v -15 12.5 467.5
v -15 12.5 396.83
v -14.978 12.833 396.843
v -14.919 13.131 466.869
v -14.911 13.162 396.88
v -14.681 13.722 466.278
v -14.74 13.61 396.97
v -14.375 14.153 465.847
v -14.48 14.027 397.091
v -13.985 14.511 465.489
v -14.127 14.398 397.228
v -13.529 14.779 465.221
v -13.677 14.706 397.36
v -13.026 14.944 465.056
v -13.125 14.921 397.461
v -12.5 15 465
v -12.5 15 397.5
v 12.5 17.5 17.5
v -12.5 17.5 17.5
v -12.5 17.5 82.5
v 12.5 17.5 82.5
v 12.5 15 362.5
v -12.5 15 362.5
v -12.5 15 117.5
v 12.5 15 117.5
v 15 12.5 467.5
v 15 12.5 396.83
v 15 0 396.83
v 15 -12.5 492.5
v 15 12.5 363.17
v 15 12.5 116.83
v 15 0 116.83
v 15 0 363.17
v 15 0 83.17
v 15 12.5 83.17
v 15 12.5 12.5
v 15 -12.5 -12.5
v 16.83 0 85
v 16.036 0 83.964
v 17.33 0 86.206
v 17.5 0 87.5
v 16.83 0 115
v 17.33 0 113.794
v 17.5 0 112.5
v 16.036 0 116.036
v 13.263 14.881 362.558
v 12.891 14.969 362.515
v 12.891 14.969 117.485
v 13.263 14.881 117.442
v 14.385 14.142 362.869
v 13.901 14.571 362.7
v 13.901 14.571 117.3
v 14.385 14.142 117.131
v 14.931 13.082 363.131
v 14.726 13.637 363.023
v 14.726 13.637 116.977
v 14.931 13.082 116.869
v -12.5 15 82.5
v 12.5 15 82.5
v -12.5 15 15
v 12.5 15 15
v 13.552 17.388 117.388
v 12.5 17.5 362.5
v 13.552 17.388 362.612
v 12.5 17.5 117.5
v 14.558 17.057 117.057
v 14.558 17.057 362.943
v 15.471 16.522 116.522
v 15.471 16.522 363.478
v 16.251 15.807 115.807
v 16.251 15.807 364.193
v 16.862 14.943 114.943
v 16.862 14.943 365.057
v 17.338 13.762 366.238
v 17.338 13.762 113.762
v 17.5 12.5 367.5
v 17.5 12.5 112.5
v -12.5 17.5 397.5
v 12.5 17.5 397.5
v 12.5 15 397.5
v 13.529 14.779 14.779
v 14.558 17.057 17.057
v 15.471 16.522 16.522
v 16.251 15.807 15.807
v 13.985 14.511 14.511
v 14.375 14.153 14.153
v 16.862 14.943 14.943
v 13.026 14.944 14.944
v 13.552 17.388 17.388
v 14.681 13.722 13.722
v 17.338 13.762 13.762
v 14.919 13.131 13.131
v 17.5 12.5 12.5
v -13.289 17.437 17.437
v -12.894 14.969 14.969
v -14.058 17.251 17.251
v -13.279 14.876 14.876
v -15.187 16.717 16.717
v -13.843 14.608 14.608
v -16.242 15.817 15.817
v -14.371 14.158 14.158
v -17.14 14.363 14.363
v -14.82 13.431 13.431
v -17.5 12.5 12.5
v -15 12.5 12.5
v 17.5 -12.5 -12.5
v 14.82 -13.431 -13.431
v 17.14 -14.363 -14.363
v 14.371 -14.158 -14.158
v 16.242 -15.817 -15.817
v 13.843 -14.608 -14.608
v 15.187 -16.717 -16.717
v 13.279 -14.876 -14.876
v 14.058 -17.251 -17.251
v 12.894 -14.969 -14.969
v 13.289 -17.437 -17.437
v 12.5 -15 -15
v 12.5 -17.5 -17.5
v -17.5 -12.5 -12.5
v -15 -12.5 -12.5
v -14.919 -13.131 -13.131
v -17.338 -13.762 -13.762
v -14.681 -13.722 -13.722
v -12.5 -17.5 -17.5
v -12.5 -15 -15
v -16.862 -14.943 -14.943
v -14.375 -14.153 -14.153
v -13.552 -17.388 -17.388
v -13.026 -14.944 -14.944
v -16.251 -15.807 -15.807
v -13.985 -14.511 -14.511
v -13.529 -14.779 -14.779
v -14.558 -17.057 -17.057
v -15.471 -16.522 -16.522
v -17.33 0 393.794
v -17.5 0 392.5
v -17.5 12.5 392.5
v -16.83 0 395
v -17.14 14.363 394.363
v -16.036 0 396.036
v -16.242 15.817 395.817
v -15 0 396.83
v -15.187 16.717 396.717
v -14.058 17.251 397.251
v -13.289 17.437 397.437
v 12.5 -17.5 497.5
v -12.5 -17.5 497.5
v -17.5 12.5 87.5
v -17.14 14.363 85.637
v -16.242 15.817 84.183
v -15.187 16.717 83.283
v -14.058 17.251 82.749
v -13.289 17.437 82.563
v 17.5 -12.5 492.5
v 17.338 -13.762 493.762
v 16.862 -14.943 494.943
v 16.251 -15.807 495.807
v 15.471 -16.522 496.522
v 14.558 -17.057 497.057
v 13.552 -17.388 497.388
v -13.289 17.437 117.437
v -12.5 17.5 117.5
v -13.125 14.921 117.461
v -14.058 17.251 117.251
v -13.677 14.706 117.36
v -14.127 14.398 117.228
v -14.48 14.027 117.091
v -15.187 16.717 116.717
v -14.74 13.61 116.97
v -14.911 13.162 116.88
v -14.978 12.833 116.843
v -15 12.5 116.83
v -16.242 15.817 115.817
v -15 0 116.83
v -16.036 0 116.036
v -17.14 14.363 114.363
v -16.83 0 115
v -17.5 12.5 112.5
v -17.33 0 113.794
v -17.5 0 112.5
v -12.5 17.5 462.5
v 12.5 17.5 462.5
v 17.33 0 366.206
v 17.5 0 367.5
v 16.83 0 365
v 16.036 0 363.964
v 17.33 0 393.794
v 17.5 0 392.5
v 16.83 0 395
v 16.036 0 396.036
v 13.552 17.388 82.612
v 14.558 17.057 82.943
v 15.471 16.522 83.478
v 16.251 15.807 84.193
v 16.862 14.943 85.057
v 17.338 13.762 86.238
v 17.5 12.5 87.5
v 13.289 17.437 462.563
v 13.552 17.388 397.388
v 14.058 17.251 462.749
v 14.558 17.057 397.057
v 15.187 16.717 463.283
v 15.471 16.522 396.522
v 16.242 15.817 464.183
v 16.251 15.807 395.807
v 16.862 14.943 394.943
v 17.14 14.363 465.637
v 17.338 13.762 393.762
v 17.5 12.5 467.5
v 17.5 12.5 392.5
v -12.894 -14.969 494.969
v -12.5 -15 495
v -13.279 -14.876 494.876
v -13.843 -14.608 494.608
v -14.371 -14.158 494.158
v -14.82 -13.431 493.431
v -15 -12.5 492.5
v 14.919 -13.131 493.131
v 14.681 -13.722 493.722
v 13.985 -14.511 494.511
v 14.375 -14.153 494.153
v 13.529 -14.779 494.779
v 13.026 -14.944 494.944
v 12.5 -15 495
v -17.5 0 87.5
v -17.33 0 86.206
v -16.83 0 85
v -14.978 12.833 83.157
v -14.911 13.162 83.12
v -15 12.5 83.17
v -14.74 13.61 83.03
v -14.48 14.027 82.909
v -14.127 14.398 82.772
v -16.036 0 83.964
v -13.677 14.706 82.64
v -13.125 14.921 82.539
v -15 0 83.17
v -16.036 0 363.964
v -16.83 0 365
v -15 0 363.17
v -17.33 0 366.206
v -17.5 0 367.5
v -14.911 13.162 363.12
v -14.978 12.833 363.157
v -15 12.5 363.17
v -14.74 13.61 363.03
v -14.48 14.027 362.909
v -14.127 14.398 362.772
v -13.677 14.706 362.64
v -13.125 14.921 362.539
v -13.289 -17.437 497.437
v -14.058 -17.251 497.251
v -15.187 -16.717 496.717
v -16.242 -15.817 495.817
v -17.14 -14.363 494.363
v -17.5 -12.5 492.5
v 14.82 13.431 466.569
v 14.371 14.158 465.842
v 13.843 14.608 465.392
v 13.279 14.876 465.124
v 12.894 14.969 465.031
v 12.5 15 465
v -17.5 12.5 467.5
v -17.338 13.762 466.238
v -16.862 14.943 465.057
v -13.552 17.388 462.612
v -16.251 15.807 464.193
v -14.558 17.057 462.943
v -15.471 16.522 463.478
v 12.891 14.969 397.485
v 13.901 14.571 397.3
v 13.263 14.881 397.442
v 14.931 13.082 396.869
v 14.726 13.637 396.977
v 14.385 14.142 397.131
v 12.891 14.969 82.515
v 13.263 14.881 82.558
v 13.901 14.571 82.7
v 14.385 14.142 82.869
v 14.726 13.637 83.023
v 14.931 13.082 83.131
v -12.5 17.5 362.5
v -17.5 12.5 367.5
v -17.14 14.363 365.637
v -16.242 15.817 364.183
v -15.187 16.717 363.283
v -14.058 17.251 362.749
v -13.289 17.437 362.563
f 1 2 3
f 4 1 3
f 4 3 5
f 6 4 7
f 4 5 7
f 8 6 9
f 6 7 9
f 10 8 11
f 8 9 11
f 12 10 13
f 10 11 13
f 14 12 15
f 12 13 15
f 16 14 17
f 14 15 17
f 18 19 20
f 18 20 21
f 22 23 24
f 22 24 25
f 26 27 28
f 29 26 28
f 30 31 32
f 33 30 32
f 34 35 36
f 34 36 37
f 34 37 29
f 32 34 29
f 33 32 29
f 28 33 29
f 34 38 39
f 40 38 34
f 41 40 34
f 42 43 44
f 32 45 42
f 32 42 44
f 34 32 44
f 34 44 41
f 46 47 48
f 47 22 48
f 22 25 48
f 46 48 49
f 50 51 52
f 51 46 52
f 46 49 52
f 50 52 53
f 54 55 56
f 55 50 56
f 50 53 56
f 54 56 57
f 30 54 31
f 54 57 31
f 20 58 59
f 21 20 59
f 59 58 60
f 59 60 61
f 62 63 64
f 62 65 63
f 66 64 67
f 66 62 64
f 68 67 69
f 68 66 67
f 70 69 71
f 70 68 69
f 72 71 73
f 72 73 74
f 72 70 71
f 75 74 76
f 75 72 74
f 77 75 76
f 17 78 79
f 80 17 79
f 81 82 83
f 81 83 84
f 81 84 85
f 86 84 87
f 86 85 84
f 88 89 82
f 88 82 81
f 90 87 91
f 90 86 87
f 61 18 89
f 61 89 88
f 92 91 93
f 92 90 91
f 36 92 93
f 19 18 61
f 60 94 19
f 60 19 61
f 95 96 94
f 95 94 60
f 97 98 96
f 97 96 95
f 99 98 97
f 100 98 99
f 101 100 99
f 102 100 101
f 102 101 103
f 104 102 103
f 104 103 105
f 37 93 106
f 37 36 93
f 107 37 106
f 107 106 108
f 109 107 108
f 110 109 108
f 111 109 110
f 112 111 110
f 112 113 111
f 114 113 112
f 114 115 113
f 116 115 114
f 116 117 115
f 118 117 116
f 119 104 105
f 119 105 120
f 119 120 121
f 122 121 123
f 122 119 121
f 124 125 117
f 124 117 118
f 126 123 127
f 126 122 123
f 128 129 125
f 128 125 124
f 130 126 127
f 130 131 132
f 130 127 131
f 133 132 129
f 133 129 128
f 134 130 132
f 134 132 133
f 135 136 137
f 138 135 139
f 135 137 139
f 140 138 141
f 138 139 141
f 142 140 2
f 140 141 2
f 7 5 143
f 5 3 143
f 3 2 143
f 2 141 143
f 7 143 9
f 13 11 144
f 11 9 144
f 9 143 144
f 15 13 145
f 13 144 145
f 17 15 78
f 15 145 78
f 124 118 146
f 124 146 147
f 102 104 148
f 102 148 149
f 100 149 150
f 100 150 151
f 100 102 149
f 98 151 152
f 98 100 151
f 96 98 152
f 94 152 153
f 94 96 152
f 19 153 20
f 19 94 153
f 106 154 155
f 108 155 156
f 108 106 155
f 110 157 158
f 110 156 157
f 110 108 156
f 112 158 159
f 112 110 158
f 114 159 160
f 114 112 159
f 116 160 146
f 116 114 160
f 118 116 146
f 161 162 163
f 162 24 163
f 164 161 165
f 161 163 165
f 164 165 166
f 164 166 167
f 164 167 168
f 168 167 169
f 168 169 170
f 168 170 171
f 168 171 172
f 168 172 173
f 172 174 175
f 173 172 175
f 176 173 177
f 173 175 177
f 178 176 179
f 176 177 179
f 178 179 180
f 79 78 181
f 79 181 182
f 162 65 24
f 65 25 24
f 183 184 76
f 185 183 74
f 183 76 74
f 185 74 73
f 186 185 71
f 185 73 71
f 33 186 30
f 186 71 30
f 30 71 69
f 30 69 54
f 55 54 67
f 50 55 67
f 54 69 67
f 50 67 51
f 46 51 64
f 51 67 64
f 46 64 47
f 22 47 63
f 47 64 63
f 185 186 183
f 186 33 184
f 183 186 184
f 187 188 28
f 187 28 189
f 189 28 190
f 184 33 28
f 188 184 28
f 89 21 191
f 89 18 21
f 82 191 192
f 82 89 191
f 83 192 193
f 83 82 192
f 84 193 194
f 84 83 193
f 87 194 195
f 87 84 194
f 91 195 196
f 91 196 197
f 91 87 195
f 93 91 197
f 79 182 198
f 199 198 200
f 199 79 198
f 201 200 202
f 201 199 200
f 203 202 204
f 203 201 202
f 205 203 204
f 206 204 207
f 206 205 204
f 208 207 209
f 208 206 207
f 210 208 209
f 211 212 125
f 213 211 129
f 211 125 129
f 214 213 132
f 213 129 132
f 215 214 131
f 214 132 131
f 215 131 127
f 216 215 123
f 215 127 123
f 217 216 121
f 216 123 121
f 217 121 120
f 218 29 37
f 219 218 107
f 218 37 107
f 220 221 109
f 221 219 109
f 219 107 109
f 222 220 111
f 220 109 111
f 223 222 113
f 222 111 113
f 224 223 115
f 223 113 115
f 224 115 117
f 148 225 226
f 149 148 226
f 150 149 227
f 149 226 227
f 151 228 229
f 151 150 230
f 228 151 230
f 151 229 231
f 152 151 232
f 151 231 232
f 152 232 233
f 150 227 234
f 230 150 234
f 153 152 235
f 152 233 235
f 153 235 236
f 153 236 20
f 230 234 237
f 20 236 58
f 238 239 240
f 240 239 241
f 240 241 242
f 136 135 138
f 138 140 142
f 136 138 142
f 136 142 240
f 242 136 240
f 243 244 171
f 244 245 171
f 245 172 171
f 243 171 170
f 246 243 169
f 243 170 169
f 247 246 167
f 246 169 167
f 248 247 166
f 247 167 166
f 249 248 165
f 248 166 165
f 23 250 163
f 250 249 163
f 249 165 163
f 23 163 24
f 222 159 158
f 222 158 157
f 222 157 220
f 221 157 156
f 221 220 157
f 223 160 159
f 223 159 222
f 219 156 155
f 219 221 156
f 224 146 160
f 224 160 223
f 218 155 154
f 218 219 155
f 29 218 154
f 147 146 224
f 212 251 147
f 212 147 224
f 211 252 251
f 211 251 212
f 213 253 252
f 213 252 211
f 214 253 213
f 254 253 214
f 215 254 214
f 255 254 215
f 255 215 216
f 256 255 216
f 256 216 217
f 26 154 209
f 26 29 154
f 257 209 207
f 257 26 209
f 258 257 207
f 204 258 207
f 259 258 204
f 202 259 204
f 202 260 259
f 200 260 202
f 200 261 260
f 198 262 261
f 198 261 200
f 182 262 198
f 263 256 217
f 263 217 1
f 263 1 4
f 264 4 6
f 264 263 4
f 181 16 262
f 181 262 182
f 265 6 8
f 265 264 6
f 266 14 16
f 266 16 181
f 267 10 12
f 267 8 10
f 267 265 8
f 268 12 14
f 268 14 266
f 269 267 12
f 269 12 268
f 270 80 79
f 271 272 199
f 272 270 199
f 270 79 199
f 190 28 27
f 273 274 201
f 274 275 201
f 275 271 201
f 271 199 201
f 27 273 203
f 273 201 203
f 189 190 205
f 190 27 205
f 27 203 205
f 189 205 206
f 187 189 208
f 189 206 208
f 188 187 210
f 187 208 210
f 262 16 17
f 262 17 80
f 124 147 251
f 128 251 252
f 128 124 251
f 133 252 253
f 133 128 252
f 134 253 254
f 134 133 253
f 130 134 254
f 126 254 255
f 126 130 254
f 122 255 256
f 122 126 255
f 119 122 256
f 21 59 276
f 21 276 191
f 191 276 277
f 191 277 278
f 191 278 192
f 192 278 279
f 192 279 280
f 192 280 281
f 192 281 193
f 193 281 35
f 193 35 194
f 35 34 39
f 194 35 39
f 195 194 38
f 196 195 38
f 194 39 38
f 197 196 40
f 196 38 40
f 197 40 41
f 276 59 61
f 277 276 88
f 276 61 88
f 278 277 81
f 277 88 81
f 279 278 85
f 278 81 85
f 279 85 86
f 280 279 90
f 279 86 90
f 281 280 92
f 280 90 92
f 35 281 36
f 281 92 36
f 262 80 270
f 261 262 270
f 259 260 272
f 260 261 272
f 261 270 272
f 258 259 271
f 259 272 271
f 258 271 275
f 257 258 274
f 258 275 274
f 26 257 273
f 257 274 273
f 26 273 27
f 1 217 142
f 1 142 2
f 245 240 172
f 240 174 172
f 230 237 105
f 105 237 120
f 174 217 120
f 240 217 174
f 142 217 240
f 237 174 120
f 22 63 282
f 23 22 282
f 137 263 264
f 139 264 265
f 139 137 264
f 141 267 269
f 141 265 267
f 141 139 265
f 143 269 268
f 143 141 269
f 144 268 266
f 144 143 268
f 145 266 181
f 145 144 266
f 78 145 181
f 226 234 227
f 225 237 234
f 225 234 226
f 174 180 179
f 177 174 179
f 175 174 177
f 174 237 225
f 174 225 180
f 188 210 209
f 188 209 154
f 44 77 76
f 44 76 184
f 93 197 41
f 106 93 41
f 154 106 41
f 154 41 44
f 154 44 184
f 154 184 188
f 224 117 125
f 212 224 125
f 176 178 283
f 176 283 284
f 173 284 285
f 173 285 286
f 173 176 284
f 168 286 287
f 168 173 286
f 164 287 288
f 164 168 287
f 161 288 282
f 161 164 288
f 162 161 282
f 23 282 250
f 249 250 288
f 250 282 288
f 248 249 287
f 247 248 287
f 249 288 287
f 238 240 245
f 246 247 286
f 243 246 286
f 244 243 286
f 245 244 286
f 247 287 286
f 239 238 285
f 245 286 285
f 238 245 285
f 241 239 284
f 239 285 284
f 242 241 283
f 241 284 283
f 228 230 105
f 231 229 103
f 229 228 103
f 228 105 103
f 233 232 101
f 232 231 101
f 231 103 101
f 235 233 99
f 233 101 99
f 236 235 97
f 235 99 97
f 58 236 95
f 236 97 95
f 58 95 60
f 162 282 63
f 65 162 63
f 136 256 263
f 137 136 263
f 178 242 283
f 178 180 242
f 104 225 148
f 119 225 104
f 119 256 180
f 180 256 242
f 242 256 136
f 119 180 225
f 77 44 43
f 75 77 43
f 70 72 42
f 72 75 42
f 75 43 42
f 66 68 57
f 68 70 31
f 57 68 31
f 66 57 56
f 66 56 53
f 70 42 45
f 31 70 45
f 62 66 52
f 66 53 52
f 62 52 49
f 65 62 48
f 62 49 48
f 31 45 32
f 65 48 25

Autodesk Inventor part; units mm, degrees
ref_plane "Start plane" through (0, 0, -17.5) normal (0, 0, 1) x (1, 0, 0)
ref_plane "End plane" through (0, 0, 497.5) normal (0, 0, 1) x (1, 0, 0)
sketch "Sketch" plane through (0, 0, 0) normal (0, 0, 1) x (1, 0, 0)
  line L0 (-17.5, -12.5) -> (-17.5, 12.5)
  line L1 (-12.5, 17.5) -> (12.5, 17.5)
  line L2 (17.5, 12.5) -> (17.5, -12.5)
  line L3 (12.5, -17.5) -> (-12.5, -17.5)
  arc A0 (-17.5, -12.5) -> (-12.5, -17.5) centre (-12.5, -12.5) ccw
  arc A1 (-12.5, 17.5) -> (-17.5, 12.5) centre (-12.5, 12.5) ccw
  arc A2 (17.5, 12.5) -> (12.5, 17.5) centre (12.5, 12.5) ccw
  arc A3 (12.5, -17.5) -> (17.5, -12.5) centre (12.5, -12.5) ccw
  arc A4 (-12.5, 15) -> (-15, 12.5) centre (-12.5, 12.5) ccw
  line L4 (-12.5, 15) -> (12.5, 15)
  arc A5 (15, 12.5) -> (12.5, 15) centre (12.5, 12.5) ccw
  line L5 (15, 12.5) -> (15, -12.5)
  arc A6 (12.5, -15) -> (15, -12.5) centre (12.5, -12.5) ccw
  line L6 (12.5, -15) -> (-12.5, -15)
  arc A7 (-15, -12.5) -> (-12.5, -15) centre (-12.5, -12.5) ccw
  line L7 (-15, -12.5) -> (-15, 12.5)
  line L8 (0, 25.9497) -> (0, -25.9497) construction
  line L9 (-25.9497, 0) -> (25.9497, 0) construction
  dimension "d7" = 5
  dimension "d10" = 35
  dimension "d11" = 35
  dimension "d12" = 2.5
  dimension "d15" = 17.5
  dimension "d16" = 17.5
extrude "Body" add sketch "Sketch" along normal up to surface (515 mm away) from surface at -17.5
sketch "Sketch3" plane through (0, 0, 0) normal (0, 0, 1) x (1, 0, 0)
  line L0 (0, 0) -> (10, 0)
ref_plane "Work Plane3" through (0, 0, 0) normal (0, -1, 0) x (1, 0, 0)
sketch "Sketch4" plane through (0, 0, 0) normal (0, -1, 0) x (1, 0, 0)
  line L0 (-2, -17.5) -> (12, -17.5)
  line L1 (-2, 497.5) -> (12, 497.5)
  dimension "d18" = 515
ref_plane "Work Plane4" through (107.5, 0, -17.5) normal (0, 0, -1) x (-1, 0, 0)
split "Split1" plane through (107.5, 0, -17.5) removes the side toward (0, 0, -1)
ref_plane "Work Plane5" through (0, -17.5, 497.5) normal (0, 0.7071, 0.7071) x (1, 0, 0)
split "Split2" plane through (0, -17.5, 497.5) removes the side toward (0, 0.7071, 0.7071)
ref_plane "Work Plane7" through (0, 780, 380) normal (0, -1, 0) x (1, 0, 0)
ref_plane "Work Plane8" through (0, 0, 380) normal (0, -1, 0) x (1, 0, 0)
ref_plane "Work Plane9" through (0, 390, 380) normal (0, -1, 0) x (1, 0, 0)
ref_plane "Work Plane10" through (0, 0, 100) normal (0, 1, 0) x (-1, 0, 0)
ref_plane "Work Plane11" through (0, 780, 100) normal (0, 1, 0) x (-1, 0, 0)
ref_plane "Work Plane12" through (0, 390, 100) normal (0, 1, 0) x (-1, 0, 0)
ref_plane "Work Plane13" through (0, -17.5, -17.5) normal (0, 0.7071, -0.7071) x (1, 0, 0)
split "Split4" plane through (0, -17.5, -17.5) removes the side toward (0, 0.7071, -0.7071)
sketch "Sketch5" plane through (0, 390, 380) normal (0, -1, 0) x (1, 0, 0)
  arc A0 (-17.5, -12.5) -> (-12.5, -17.5) centre (-12.5, -12.5) ccw
  line L0 (-17.5, -12.5) -> (-17.5, 12.5)
  arc A1 (-12.5, 17.5) -> (-17.5, 12.5) centre (-12.5, 12.5) ccw
  line L1 (-12.5, 17.5) -> (12.5, 17.5)
  arc A2 (17.5, 12.5) -> (12.5, 17.5) centre (12.5, 12.5) ccw
  line L2 (17.5, 12.5) -> (17.5, -12.5)
  arc A3 (12.5, -17.5) -> (17.5, -12.5) centre (12.5, -12.5) ccw
  line L3 (12.5, -17.5) -> (-12.5, -17.5)
  arc A4 (-12.5, 15) -> (-15, 12.5) centre (-12.5, 12.5) ccw
  line L4 (-12.5, 15) -> (12.5, 15)
  arc A5 (15, 12.5) -> (12.5, 15) centre (12.5, 12.5) ccw
  line L5 (15, 12.5) -> (15, -12.5)
  arc A6 (12.5, -15) -> (15, -12.5) centre (12.5, -12.5) ccw
  line L6 (12.5, -15) -> (-12.5, -15)
  arc A7 (-15, -12.5) -> (-12.5, -15) centre (-12.5, -12.5) ccw
  line L7 (-15, -12.5) -> (-15, 12.5)
extrude "Extrusion2" cut sketch "Sketch5" along normal up to surface (780 mm away) from surface at -390 contours L0 A1 L1 A2 L2 A3 L3 A0 | L4 A5 L5 A6 L6 A7 L7 A4
sketch "Sketch6" plane through (0, 390, 100) normal (0, 1, 0) x (-1, 0, 0)
  arc A0 (-17.5, -12.5) -> (-12.5, -17.5) centre (-12.5, -12.5) ccw
  line L0 (-17.5, -12.5) -> (-17.5, 12.5)
  arc A1 (-12.5, 17.5) -> (-17.5, 12.5) centre (-12.5, 12.5) ccw
  line L1 (-12.5, 17.5) -> (12.5, 17.5)
  arc A2 (17.5, 12.5) -> (12.5, 17.5) centre (12.5, 12.5) ccw
  line L2 (17.5, 12.5) -> (17.5, -12.5)
  arc A3 (12.5, -17.5) -> (17.5, -12.5) centre (12.5, -12.5) ccw
  line L3 (12.5, -17.5) -> (-12.5, -17.5)
  arc A4 (-12.5, 15) -> (-15, 12.5) centre (-12.5, 12.5) ccw
  line L4 (-12.5, 15) -> (12.5, 15)
  arc A5 (15, 12.5) -> (12.5, 15) centre (12.5, 12.5) ccw
  line L5 (15, 12.5) -> (15, -12.5)
  arc A6 (12.5, -15) -> (15, -12.5) centre (12.5, -12.5) ccw
  line L6 (12.5, -15) -> (-12.5, -15)
  arc A7 (-15, -12.5) -> (-12.5, -15) centre (-12.5, -12.5) ccw
  line L7 (-15, -12.5) -> (-15, 12.5)
extrude "Extrusion3" cut sketch "Sketch6" along normal up to surface (780 mm away) from surface at -390 contours L0 A1 L1 A2 L2 A3 L3 A0 | L4 A5 L5 A6 L6 A7 L7 A4
equation "\"d7\" = G_IR"
equation "\"d10\" = G_H"
equation "\"d11\" = G_W"
equation "\"d12\" = G_T"
equation "\"d15\" = 0.5 * d10"
equation "\"d16\" = 0.5 * d11"
equation "\"d3\" = G_L"
equation "\"G_W\" = 35"
equation "\"G_H\" = 35"
equation "\"G_T\" = 2.5"
equation "\"G_IR\" = 5"
equation "\"G_L\" = d18"
equation "\"G_OFFSET_START\" = 17.5"
equation "\"G_OFFSET_END\" = 17.5"
equation "\"d13\" = -G_OFFSET_START"
equation "\"d14\" = G_OFFSET_END + B_L"
equation "\"B_L\" = 480"
properties part number "AS 1163 - C350L0 35x35x2.5 SHS - 515" material "Steel, Mild"
